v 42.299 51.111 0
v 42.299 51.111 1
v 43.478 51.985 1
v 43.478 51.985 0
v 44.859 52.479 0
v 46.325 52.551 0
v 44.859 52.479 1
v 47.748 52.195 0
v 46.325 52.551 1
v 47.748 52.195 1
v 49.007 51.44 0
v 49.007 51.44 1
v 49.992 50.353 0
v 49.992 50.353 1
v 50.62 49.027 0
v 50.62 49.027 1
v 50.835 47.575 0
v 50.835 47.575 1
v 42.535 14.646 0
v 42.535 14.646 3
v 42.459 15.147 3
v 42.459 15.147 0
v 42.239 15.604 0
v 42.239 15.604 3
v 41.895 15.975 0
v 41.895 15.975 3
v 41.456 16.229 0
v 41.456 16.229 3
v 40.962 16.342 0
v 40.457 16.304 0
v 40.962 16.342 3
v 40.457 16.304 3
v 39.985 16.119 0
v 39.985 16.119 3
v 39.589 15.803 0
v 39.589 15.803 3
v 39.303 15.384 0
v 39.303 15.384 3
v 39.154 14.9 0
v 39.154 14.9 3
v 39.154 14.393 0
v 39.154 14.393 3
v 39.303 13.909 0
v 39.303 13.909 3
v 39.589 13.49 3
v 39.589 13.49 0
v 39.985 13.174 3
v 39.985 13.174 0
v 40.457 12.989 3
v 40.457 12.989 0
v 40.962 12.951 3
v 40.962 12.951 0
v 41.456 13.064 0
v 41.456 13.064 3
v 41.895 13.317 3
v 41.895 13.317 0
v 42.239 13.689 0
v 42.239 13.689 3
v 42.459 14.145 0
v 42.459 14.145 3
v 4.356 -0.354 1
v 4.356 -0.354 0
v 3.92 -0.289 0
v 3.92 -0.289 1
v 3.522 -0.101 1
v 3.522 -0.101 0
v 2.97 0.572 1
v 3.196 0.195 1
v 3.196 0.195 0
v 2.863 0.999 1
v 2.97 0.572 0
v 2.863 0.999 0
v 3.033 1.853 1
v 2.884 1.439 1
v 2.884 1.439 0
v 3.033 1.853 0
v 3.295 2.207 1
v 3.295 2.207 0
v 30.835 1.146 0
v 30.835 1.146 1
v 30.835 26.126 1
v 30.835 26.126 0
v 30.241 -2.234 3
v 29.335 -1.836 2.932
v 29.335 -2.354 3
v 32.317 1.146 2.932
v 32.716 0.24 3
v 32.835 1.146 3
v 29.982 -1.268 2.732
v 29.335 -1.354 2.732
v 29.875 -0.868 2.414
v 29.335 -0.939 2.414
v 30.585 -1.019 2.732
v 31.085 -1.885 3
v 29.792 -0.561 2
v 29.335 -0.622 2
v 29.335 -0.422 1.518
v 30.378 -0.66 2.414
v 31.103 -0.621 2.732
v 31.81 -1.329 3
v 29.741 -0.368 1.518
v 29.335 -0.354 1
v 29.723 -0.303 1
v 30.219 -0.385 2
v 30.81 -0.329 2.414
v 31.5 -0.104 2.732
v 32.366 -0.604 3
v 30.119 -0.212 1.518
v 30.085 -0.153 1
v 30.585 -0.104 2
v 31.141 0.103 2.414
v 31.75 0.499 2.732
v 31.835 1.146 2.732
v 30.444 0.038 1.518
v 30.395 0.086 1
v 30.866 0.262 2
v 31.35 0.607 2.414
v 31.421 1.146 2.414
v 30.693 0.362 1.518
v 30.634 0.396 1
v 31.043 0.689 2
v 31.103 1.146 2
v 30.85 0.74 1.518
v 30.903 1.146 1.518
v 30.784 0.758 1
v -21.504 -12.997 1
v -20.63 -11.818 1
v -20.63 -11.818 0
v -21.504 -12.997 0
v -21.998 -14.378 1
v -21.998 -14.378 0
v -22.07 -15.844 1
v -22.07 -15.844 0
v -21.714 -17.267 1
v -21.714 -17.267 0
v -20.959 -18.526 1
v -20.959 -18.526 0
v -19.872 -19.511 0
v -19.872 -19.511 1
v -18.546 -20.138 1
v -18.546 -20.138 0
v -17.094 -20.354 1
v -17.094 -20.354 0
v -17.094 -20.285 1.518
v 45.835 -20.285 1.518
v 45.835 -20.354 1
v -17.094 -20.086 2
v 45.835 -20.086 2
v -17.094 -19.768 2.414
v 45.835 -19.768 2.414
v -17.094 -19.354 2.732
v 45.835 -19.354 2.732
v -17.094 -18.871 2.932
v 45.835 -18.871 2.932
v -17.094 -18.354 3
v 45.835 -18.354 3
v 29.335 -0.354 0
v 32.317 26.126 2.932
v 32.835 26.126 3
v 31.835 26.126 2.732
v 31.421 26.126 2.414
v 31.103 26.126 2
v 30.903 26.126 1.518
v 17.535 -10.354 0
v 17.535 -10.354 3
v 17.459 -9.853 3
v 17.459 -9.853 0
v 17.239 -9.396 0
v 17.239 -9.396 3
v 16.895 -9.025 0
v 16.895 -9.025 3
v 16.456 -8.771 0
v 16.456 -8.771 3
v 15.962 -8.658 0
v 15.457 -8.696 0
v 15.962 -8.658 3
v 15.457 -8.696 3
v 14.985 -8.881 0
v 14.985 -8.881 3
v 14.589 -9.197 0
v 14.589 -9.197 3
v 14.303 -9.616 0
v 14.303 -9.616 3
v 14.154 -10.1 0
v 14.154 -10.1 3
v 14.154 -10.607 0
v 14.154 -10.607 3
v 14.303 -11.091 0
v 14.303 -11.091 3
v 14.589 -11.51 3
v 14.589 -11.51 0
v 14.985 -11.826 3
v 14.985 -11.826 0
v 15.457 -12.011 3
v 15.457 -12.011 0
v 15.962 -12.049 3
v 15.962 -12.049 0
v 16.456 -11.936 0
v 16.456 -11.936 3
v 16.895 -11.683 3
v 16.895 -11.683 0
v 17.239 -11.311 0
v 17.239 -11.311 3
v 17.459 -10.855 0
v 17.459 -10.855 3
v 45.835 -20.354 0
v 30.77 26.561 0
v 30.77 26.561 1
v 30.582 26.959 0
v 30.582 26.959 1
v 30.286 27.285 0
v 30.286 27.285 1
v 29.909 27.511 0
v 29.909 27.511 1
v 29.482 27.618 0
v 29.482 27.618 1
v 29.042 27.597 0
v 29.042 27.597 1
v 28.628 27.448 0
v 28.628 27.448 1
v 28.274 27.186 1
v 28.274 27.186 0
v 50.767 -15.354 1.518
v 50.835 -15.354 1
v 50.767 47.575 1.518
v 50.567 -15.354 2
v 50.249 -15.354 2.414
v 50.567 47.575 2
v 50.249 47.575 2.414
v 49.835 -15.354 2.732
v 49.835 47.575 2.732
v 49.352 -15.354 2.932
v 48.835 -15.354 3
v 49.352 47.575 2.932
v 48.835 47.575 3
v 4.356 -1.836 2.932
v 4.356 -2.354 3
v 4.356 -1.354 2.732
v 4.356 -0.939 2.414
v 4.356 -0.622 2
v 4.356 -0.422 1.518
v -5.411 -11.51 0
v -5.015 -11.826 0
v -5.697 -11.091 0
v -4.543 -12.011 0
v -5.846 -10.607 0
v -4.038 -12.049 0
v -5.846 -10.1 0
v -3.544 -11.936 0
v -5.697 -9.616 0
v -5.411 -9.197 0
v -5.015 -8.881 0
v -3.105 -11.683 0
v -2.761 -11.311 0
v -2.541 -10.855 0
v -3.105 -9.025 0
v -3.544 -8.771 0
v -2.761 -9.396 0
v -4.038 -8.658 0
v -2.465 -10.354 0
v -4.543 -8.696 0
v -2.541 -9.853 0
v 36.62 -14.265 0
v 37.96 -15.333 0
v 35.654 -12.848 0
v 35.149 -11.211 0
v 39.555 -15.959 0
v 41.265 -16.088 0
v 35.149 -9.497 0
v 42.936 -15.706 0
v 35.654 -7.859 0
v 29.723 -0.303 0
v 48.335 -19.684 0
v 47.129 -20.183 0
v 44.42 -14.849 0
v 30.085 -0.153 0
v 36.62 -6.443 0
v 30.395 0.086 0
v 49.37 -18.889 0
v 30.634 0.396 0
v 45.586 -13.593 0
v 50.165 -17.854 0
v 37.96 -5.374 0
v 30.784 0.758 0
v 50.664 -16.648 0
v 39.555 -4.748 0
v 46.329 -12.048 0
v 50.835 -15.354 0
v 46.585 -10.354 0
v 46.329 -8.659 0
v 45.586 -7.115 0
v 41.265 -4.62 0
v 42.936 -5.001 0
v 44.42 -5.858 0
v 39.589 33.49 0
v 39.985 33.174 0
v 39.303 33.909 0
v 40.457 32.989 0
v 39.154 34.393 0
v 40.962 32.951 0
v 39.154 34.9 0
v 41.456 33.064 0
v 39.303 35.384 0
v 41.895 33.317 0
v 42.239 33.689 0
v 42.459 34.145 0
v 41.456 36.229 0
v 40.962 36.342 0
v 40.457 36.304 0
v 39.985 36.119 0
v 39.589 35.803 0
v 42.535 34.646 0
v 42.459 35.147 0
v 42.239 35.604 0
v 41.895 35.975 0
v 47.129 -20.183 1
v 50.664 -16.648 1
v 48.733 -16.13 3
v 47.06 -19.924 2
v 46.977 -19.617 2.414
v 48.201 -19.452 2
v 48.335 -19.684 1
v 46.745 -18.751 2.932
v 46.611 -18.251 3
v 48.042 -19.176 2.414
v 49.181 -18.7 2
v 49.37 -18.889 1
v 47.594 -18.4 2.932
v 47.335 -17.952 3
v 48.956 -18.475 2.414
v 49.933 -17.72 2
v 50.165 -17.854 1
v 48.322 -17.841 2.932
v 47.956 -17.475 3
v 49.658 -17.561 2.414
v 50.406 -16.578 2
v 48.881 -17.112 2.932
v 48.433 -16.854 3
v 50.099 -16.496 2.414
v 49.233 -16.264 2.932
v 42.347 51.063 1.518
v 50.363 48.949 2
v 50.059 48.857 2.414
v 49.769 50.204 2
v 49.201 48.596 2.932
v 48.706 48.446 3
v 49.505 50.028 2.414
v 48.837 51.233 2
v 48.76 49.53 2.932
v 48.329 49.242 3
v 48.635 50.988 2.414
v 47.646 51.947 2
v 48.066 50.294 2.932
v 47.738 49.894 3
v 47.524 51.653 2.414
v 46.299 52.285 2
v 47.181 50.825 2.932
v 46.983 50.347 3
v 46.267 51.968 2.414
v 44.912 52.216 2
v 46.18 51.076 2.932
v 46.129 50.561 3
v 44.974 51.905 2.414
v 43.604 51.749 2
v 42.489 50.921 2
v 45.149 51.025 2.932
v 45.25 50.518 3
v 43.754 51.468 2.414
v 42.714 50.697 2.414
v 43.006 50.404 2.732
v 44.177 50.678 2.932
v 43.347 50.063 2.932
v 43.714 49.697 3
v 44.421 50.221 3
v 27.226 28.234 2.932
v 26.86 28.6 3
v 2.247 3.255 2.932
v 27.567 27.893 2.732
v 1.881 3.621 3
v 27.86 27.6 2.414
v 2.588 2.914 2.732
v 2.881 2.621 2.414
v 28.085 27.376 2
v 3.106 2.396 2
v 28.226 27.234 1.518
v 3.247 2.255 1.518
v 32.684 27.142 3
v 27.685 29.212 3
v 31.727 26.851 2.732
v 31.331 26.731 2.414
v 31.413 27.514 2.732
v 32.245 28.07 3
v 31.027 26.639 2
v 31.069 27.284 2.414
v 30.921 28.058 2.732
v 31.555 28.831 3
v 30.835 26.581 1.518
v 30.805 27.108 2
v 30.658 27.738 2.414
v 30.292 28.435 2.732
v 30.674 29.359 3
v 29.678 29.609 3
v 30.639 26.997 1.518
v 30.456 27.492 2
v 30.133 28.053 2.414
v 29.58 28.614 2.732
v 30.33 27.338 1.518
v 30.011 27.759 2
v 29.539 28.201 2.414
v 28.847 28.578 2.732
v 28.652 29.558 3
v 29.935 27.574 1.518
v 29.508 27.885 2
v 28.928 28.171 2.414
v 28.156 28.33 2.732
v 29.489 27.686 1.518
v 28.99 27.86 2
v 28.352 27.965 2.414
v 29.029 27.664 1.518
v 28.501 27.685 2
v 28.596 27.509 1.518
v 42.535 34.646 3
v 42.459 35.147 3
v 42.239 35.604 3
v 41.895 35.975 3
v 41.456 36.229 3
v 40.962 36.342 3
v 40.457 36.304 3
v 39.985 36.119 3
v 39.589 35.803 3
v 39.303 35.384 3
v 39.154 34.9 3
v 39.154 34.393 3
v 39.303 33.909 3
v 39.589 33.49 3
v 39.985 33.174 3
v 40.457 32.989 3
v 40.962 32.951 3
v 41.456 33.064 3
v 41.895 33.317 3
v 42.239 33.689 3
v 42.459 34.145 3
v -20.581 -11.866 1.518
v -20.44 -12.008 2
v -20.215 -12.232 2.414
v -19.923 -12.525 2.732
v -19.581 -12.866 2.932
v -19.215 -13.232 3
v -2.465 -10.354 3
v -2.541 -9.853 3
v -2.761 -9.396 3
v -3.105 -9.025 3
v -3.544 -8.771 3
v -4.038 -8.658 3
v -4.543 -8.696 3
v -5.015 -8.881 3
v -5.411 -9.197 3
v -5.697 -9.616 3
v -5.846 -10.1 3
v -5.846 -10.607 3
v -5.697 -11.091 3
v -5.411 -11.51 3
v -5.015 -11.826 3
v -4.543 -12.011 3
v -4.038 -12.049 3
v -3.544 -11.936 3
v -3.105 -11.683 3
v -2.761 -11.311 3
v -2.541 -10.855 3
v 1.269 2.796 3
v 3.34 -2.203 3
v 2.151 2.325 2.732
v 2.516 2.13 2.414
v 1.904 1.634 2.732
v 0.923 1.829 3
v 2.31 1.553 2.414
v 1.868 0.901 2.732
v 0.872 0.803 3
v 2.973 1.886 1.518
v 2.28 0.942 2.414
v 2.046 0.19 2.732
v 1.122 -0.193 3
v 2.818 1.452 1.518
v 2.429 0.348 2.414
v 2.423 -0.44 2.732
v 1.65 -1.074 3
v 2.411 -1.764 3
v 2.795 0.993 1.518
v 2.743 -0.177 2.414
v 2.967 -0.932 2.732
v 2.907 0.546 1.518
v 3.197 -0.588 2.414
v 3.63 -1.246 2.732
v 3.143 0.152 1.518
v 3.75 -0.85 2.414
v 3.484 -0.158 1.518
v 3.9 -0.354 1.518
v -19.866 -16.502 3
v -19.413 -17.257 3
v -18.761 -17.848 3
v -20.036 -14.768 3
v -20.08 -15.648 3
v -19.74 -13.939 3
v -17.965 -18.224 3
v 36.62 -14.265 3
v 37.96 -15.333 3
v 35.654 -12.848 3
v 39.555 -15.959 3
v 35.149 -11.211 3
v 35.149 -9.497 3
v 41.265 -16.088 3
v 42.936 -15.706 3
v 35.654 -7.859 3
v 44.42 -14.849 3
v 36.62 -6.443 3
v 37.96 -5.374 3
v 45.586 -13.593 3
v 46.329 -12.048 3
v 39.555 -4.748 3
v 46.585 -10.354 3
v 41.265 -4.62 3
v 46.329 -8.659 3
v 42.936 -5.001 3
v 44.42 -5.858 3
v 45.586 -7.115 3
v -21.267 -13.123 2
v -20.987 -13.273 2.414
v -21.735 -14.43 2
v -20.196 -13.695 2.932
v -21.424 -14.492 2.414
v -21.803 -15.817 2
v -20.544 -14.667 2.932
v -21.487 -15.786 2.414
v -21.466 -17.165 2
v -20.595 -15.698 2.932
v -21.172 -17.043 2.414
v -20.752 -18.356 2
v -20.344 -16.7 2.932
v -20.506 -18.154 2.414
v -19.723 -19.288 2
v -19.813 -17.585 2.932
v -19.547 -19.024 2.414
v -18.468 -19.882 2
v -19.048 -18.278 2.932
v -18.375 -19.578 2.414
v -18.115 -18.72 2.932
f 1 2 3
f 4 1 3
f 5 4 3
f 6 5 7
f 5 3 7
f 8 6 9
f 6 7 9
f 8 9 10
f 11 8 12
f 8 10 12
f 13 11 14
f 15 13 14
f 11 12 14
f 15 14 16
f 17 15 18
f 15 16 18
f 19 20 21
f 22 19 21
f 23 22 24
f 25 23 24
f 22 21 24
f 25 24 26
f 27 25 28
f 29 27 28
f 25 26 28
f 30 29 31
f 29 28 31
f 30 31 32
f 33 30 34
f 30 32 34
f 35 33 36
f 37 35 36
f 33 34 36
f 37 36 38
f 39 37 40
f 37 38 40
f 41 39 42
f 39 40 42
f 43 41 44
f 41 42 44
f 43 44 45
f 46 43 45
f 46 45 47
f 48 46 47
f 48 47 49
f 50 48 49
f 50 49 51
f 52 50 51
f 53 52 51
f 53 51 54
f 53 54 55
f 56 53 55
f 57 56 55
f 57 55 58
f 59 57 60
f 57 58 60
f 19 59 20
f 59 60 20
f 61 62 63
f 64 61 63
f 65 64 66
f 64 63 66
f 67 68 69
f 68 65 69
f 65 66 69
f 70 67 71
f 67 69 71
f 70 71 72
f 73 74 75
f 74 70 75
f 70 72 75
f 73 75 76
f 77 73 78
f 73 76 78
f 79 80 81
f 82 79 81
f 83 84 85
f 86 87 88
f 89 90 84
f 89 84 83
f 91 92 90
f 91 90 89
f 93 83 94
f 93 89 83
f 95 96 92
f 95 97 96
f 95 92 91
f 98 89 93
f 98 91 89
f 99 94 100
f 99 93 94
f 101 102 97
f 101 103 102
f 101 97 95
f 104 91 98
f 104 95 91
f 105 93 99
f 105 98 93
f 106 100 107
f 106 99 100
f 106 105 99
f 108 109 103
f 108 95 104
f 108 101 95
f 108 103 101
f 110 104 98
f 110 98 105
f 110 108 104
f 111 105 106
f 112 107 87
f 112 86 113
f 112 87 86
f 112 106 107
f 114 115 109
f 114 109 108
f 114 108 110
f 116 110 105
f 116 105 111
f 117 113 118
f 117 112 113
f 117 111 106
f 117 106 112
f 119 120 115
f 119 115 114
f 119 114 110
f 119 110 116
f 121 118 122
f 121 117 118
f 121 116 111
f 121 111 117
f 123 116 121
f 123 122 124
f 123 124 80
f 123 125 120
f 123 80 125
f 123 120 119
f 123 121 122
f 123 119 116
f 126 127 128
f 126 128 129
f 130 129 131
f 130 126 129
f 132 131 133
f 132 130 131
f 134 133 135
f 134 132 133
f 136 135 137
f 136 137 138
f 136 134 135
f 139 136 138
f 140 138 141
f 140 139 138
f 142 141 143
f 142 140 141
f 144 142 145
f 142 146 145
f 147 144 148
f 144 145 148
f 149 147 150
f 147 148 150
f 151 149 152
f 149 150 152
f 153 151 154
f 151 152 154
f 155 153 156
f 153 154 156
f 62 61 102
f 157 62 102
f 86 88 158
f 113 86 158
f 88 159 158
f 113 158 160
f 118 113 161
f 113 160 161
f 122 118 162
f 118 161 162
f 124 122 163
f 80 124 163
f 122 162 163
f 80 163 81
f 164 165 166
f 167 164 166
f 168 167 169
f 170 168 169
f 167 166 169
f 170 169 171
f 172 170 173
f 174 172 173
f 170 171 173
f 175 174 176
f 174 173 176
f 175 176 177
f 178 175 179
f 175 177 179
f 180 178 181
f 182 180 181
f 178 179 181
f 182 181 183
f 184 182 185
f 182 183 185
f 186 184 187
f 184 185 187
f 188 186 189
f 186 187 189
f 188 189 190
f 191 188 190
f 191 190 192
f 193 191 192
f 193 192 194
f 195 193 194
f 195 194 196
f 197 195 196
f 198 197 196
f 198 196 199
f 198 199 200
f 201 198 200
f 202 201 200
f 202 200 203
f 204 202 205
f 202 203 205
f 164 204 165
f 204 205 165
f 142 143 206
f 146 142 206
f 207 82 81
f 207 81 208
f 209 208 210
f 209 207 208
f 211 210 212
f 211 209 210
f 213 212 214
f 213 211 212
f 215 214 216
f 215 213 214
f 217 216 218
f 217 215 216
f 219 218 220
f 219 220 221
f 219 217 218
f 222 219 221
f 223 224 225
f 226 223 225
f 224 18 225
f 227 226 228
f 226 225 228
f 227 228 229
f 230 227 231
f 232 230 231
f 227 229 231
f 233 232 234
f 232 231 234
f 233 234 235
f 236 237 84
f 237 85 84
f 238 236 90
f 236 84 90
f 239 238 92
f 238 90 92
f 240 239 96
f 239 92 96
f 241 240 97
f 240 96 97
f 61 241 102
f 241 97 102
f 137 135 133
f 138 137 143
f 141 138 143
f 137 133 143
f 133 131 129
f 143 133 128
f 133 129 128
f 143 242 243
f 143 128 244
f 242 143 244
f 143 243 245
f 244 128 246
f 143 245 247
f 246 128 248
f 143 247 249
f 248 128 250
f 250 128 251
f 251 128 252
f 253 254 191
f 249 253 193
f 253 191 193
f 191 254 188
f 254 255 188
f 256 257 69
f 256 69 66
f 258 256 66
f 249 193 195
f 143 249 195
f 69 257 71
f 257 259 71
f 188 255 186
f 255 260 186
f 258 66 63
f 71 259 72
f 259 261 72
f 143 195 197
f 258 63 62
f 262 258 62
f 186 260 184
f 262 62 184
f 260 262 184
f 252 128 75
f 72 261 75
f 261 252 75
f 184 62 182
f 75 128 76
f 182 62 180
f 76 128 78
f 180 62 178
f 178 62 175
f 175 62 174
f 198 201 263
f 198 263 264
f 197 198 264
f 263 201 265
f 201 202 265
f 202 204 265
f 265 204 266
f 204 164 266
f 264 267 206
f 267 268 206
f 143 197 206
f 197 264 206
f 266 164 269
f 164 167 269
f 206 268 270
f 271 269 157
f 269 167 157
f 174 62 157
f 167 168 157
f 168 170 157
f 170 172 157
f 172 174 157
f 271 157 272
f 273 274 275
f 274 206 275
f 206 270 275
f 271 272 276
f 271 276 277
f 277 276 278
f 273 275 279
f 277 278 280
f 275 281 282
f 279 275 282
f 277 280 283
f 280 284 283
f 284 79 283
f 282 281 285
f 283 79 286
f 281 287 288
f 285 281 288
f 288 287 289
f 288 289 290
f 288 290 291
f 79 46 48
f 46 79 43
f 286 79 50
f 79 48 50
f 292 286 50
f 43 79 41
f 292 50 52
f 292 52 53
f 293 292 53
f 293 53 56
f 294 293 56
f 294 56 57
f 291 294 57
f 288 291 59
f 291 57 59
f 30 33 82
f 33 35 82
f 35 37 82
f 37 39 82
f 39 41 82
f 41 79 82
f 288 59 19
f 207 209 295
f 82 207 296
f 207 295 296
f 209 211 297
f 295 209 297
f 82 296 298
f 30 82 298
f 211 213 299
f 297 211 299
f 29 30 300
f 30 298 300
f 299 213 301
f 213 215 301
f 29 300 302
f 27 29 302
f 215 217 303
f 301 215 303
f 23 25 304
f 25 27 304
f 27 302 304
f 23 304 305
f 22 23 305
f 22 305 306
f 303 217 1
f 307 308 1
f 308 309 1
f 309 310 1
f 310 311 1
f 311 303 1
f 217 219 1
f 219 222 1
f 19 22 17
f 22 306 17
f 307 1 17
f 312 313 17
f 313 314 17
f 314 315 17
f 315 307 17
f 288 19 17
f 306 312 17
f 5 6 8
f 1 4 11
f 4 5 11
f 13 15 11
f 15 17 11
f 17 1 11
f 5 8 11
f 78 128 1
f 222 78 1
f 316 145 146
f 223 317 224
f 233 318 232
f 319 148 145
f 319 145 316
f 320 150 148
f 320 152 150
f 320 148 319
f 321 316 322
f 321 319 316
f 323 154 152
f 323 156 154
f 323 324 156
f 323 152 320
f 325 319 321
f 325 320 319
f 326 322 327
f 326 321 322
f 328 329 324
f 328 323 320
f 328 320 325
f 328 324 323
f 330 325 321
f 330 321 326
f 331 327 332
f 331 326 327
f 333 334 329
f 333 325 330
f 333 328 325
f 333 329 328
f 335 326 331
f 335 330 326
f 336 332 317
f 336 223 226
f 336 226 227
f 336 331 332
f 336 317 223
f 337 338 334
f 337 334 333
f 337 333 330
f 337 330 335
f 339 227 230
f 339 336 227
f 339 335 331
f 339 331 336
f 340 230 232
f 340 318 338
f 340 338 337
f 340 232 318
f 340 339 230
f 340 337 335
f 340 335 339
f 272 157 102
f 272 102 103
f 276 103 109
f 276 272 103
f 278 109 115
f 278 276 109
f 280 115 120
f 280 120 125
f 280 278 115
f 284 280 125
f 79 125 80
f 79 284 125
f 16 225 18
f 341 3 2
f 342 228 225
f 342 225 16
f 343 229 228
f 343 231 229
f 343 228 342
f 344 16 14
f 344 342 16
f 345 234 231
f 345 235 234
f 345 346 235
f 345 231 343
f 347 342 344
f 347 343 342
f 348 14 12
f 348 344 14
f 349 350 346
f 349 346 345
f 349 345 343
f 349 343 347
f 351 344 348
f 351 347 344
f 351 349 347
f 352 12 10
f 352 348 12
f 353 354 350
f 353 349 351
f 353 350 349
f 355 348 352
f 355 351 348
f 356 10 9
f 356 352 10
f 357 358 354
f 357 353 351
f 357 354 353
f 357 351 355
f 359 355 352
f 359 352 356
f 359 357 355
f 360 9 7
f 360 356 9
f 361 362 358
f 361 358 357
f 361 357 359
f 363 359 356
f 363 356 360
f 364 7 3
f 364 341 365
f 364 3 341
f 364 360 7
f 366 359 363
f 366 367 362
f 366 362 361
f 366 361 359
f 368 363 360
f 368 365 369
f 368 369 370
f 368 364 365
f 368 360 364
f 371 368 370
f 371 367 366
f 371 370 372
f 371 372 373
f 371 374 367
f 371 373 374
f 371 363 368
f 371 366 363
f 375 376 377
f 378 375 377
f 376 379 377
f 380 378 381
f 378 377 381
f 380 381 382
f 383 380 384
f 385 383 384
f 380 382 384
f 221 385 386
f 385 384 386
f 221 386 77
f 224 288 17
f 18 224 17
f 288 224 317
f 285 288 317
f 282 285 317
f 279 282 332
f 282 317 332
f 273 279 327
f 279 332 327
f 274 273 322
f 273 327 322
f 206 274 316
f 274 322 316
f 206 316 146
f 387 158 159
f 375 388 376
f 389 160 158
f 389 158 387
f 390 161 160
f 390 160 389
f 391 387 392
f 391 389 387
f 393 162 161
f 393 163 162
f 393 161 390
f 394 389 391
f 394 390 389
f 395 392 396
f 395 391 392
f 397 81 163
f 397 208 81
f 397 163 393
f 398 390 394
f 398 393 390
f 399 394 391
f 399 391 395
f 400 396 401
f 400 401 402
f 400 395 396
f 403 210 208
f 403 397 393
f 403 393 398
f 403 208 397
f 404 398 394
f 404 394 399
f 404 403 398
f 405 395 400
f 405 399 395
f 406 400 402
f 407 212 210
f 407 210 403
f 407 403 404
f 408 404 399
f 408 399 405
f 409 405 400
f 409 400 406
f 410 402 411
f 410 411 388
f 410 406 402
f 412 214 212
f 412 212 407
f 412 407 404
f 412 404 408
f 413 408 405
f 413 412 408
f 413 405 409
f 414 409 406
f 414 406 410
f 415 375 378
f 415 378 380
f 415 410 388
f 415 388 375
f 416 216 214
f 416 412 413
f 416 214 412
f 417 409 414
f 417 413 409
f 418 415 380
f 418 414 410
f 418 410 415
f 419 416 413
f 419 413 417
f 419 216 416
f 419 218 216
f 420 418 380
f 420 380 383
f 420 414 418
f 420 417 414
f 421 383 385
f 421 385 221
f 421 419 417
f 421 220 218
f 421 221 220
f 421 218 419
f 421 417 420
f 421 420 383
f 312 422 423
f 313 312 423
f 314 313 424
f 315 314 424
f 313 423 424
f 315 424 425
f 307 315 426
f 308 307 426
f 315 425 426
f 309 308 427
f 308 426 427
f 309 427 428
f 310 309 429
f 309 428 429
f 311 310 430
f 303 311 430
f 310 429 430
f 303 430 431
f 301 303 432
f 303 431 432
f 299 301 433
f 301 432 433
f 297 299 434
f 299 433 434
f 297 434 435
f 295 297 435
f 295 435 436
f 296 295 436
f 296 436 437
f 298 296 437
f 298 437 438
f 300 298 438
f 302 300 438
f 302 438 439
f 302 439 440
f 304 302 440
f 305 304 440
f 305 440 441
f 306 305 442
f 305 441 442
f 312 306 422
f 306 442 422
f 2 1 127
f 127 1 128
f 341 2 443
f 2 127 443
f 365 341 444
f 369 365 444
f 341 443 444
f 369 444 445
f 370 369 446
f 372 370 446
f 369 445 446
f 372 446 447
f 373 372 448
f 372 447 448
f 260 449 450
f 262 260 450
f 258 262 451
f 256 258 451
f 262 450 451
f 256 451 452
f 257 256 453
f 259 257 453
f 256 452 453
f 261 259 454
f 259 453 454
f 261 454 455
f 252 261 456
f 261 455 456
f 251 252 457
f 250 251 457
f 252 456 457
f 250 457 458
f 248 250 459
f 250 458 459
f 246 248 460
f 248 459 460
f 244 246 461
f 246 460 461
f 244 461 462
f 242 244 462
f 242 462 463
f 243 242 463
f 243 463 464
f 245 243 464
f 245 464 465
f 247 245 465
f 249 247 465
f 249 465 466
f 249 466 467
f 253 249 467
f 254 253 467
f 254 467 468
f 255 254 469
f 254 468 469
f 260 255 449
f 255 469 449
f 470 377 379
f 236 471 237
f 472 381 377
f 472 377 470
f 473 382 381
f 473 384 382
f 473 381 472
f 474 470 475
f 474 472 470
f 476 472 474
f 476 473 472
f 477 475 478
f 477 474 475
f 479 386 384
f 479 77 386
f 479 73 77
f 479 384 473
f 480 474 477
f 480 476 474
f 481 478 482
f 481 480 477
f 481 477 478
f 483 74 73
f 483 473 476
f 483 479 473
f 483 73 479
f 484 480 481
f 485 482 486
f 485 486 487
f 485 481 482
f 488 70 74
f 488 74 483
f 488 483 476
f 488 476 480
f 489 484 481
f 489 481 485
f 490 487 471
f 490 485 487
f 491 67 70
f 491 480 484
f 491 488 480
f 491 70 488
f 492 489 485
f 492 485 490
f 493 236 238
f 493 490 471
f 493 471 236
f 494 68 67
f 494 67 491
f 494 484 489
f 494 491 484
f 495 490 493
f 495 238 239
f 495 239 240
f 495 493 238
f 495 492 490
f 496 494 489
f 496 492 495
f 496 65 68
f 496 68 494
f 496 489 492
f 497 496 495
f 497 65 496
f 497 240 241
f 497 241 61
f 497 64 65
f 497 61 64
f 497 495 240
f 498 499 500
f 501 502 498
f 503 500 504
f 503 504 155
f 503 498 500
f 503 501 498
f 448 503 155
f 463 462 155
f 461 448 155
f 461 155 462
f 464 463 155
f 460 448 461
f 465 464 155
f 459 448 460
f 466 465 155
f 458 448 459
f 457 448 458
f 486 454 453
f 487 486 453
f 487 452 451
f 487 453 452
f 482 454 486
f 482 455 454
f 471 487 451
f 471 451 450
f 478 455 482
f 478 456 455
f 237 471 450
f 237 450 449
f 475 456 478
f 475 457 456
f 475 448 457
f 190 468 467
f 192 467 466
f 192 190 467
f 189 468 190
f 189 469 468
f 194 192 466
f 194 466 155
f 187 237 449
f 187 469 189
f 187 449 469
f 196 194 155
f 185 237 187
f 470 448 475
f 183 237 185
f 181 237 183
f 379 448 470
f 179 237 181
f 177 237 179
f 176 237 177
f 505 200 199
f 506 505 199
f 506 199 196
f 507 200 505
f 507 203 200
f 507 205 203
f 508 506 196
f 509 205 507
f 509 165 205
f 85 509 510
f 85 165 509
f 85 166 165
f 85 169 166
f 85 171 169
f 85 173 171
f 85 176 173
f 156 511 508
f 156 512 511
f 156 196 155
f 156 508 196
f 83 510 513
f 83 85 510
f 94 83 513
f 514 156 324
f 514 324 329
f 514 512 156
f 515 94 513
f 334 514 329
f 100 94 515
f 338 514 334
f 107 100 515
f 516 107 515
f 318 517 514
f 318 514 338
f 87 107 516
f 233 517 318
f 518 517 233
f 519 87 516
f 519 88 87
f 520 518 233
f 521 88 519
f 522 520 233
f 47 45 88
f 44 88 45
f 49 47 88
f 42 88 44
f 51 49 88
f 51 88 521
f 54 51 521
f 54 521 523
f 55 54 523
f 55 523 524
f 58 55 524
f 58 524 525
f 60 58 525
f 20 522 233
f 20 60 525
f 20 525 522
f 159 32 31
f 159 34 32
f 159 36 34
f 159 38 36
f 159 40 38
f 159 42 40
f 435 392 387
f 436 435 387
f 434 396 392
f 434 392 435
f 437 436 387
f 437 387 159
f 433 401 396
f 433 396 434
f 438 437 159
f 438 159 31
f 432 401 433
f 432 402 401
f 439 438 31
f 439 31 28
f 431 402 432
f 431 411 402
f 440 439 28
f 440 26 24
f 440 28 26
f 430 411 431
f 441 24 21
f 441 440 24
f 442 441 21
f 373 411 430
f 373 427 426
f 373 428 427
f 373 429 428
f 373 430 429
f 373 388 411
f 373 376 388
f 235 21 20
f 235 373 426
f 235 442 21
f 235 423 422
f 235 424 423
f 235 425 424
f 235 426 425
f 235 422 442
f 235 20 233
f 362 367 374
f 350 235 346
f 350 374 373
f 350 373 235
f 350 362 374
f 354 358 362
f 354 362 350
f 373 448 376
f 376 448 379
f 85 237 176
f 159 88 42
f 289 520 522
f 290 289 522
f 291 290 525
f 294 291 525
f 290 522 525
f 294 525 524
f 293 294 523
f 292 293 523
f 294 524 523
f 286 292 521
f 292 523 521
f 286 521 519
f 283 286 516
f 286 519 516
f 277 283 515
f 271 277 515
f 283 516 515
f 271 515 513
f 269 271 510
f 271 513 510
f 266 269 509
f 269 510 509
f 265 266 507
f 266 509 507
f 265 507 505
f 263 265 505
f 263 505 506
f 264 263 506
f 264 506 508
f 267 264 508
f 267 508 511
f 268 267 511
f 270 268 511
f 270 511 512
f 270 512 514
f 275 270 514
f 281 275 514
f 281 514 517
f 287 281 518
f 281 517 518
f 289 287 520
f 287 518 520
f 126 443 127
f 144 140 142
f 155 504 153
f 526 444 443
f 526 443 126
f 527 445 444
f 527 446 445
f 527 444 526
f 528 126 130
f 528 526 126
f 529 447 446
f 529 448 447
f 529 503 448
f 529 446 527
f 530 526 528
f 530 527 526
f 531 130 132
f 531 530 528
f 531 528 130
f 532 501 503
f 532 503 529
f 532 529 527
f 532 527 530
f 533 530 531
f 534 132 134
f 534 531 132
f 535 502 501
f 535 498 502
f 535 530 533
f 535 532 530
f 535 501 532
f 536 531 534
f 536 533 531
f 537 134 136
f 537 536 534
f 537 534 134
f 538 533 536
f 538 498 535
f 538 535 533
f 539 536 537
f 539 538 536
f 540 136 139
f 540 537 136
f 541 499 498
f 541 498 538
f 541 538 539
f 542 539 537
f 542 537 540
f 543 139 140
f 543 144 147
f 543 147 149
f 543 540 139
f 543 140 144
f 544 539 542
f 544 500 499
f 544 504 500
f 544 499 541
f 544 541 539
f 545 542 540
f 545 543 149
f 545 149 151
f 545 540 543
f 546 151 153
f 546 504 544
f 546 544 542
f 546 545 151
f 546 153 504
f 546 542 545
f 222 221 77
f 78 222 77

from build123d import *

# Parameters (mm, degrees)
F1_DEPTH = 3
F2_R     = 5.75
F2_R_2   = 1.7
F3_DEPTH = 3
F4_R     = 1.5
F5_R     = 5
F6_R     = 2
F7_R     = 2


with BuildPart() as f1:
    # F0 (on Top) → F1 (new body)
    with BuildSketch(Plane.XY):
        Polygon((50.8348240464, 59.6463644877), (-29.1651759536, -20.3536355123), (50.8348240464, -20.3536355123), align=None)
    extrude(amount=F1_DEPTH)

    # F2 (on face) → F3 (cut, through all)
    with BuildSketch(Plane.XY.offset(3)):
        Polygon((0.734318983, -0.3536355123), (30.8348240464, -0.3536355123), (30.8348240464, 29.7468695511), align=None)
        with Locations((40.8348240464, -10.3536355123)):
            Circle(F2_R)
        with Locations((15.8348240464, -10.3536355123)):
            Circle(F2_R_2)
        with Locations((-4.1651759536, -10.3536355123)):
            Circle(F2_R_2)
        with Locations((40.8348240464, 14.6463644877)):
            Circle(F2_R_2)
        with Locations((40.8348240464, 34.6463644877)):
            Circle(F2_R_2)
    extrude(amount=-F3_DEPTH, mode=Mode.SUBTRACT)

    # F4
    f4_edges = [f1.edges().sort_by_distance(p)[0] for p in [
        (0.734319, -0.353636, 1.5),
        (30.834824, -0.353636, 1.5),
        (30.834824, 29.74687, 1.5),
    ]]
    fillet(f4_edges, radius=F4_R)

    # F5
    f5_edges = [f1.edges().sort_by_distance(p)[0] for p in [
        (-29.165176, -20.353636, 1.5),
        (50.834824, -20.353636, 1.5),
        (50.834824, 59.646364, 1.5),
    ]]
    fillet(f5_edges, radius=F5_R)

    # F6
    f6_edges = [f1.edges().sort_by_distance(p)[0] for p in [
        (14.370358, -20.353636, 3),
        (49.370358, -18.889169, 3),
        (50.834824, 16.110831, 3),
        (-21.713506, -17.267053, 3),
        (10.834824, 19.646364, 3),
        (47.748241, 52.194694, 3),
    ]]
    fillet(f6_edges, radius=F6_R)

    # F7
    f7_edges = [f1.edges().sort_by_distance(p)[0] for p in [
        (16.845232, -0.353636, 3),
        (30.834824, 13.635957, 3),
        (15.784572, 14.696617, 3),
        (30.395484, 0.085704, 3),
        (2.96982, 0.572339, 3),
        (29.908849, 27.511369, 3),
    ]]
    fillet(f7_edges, radius=F7_R)


solid = f1.part
